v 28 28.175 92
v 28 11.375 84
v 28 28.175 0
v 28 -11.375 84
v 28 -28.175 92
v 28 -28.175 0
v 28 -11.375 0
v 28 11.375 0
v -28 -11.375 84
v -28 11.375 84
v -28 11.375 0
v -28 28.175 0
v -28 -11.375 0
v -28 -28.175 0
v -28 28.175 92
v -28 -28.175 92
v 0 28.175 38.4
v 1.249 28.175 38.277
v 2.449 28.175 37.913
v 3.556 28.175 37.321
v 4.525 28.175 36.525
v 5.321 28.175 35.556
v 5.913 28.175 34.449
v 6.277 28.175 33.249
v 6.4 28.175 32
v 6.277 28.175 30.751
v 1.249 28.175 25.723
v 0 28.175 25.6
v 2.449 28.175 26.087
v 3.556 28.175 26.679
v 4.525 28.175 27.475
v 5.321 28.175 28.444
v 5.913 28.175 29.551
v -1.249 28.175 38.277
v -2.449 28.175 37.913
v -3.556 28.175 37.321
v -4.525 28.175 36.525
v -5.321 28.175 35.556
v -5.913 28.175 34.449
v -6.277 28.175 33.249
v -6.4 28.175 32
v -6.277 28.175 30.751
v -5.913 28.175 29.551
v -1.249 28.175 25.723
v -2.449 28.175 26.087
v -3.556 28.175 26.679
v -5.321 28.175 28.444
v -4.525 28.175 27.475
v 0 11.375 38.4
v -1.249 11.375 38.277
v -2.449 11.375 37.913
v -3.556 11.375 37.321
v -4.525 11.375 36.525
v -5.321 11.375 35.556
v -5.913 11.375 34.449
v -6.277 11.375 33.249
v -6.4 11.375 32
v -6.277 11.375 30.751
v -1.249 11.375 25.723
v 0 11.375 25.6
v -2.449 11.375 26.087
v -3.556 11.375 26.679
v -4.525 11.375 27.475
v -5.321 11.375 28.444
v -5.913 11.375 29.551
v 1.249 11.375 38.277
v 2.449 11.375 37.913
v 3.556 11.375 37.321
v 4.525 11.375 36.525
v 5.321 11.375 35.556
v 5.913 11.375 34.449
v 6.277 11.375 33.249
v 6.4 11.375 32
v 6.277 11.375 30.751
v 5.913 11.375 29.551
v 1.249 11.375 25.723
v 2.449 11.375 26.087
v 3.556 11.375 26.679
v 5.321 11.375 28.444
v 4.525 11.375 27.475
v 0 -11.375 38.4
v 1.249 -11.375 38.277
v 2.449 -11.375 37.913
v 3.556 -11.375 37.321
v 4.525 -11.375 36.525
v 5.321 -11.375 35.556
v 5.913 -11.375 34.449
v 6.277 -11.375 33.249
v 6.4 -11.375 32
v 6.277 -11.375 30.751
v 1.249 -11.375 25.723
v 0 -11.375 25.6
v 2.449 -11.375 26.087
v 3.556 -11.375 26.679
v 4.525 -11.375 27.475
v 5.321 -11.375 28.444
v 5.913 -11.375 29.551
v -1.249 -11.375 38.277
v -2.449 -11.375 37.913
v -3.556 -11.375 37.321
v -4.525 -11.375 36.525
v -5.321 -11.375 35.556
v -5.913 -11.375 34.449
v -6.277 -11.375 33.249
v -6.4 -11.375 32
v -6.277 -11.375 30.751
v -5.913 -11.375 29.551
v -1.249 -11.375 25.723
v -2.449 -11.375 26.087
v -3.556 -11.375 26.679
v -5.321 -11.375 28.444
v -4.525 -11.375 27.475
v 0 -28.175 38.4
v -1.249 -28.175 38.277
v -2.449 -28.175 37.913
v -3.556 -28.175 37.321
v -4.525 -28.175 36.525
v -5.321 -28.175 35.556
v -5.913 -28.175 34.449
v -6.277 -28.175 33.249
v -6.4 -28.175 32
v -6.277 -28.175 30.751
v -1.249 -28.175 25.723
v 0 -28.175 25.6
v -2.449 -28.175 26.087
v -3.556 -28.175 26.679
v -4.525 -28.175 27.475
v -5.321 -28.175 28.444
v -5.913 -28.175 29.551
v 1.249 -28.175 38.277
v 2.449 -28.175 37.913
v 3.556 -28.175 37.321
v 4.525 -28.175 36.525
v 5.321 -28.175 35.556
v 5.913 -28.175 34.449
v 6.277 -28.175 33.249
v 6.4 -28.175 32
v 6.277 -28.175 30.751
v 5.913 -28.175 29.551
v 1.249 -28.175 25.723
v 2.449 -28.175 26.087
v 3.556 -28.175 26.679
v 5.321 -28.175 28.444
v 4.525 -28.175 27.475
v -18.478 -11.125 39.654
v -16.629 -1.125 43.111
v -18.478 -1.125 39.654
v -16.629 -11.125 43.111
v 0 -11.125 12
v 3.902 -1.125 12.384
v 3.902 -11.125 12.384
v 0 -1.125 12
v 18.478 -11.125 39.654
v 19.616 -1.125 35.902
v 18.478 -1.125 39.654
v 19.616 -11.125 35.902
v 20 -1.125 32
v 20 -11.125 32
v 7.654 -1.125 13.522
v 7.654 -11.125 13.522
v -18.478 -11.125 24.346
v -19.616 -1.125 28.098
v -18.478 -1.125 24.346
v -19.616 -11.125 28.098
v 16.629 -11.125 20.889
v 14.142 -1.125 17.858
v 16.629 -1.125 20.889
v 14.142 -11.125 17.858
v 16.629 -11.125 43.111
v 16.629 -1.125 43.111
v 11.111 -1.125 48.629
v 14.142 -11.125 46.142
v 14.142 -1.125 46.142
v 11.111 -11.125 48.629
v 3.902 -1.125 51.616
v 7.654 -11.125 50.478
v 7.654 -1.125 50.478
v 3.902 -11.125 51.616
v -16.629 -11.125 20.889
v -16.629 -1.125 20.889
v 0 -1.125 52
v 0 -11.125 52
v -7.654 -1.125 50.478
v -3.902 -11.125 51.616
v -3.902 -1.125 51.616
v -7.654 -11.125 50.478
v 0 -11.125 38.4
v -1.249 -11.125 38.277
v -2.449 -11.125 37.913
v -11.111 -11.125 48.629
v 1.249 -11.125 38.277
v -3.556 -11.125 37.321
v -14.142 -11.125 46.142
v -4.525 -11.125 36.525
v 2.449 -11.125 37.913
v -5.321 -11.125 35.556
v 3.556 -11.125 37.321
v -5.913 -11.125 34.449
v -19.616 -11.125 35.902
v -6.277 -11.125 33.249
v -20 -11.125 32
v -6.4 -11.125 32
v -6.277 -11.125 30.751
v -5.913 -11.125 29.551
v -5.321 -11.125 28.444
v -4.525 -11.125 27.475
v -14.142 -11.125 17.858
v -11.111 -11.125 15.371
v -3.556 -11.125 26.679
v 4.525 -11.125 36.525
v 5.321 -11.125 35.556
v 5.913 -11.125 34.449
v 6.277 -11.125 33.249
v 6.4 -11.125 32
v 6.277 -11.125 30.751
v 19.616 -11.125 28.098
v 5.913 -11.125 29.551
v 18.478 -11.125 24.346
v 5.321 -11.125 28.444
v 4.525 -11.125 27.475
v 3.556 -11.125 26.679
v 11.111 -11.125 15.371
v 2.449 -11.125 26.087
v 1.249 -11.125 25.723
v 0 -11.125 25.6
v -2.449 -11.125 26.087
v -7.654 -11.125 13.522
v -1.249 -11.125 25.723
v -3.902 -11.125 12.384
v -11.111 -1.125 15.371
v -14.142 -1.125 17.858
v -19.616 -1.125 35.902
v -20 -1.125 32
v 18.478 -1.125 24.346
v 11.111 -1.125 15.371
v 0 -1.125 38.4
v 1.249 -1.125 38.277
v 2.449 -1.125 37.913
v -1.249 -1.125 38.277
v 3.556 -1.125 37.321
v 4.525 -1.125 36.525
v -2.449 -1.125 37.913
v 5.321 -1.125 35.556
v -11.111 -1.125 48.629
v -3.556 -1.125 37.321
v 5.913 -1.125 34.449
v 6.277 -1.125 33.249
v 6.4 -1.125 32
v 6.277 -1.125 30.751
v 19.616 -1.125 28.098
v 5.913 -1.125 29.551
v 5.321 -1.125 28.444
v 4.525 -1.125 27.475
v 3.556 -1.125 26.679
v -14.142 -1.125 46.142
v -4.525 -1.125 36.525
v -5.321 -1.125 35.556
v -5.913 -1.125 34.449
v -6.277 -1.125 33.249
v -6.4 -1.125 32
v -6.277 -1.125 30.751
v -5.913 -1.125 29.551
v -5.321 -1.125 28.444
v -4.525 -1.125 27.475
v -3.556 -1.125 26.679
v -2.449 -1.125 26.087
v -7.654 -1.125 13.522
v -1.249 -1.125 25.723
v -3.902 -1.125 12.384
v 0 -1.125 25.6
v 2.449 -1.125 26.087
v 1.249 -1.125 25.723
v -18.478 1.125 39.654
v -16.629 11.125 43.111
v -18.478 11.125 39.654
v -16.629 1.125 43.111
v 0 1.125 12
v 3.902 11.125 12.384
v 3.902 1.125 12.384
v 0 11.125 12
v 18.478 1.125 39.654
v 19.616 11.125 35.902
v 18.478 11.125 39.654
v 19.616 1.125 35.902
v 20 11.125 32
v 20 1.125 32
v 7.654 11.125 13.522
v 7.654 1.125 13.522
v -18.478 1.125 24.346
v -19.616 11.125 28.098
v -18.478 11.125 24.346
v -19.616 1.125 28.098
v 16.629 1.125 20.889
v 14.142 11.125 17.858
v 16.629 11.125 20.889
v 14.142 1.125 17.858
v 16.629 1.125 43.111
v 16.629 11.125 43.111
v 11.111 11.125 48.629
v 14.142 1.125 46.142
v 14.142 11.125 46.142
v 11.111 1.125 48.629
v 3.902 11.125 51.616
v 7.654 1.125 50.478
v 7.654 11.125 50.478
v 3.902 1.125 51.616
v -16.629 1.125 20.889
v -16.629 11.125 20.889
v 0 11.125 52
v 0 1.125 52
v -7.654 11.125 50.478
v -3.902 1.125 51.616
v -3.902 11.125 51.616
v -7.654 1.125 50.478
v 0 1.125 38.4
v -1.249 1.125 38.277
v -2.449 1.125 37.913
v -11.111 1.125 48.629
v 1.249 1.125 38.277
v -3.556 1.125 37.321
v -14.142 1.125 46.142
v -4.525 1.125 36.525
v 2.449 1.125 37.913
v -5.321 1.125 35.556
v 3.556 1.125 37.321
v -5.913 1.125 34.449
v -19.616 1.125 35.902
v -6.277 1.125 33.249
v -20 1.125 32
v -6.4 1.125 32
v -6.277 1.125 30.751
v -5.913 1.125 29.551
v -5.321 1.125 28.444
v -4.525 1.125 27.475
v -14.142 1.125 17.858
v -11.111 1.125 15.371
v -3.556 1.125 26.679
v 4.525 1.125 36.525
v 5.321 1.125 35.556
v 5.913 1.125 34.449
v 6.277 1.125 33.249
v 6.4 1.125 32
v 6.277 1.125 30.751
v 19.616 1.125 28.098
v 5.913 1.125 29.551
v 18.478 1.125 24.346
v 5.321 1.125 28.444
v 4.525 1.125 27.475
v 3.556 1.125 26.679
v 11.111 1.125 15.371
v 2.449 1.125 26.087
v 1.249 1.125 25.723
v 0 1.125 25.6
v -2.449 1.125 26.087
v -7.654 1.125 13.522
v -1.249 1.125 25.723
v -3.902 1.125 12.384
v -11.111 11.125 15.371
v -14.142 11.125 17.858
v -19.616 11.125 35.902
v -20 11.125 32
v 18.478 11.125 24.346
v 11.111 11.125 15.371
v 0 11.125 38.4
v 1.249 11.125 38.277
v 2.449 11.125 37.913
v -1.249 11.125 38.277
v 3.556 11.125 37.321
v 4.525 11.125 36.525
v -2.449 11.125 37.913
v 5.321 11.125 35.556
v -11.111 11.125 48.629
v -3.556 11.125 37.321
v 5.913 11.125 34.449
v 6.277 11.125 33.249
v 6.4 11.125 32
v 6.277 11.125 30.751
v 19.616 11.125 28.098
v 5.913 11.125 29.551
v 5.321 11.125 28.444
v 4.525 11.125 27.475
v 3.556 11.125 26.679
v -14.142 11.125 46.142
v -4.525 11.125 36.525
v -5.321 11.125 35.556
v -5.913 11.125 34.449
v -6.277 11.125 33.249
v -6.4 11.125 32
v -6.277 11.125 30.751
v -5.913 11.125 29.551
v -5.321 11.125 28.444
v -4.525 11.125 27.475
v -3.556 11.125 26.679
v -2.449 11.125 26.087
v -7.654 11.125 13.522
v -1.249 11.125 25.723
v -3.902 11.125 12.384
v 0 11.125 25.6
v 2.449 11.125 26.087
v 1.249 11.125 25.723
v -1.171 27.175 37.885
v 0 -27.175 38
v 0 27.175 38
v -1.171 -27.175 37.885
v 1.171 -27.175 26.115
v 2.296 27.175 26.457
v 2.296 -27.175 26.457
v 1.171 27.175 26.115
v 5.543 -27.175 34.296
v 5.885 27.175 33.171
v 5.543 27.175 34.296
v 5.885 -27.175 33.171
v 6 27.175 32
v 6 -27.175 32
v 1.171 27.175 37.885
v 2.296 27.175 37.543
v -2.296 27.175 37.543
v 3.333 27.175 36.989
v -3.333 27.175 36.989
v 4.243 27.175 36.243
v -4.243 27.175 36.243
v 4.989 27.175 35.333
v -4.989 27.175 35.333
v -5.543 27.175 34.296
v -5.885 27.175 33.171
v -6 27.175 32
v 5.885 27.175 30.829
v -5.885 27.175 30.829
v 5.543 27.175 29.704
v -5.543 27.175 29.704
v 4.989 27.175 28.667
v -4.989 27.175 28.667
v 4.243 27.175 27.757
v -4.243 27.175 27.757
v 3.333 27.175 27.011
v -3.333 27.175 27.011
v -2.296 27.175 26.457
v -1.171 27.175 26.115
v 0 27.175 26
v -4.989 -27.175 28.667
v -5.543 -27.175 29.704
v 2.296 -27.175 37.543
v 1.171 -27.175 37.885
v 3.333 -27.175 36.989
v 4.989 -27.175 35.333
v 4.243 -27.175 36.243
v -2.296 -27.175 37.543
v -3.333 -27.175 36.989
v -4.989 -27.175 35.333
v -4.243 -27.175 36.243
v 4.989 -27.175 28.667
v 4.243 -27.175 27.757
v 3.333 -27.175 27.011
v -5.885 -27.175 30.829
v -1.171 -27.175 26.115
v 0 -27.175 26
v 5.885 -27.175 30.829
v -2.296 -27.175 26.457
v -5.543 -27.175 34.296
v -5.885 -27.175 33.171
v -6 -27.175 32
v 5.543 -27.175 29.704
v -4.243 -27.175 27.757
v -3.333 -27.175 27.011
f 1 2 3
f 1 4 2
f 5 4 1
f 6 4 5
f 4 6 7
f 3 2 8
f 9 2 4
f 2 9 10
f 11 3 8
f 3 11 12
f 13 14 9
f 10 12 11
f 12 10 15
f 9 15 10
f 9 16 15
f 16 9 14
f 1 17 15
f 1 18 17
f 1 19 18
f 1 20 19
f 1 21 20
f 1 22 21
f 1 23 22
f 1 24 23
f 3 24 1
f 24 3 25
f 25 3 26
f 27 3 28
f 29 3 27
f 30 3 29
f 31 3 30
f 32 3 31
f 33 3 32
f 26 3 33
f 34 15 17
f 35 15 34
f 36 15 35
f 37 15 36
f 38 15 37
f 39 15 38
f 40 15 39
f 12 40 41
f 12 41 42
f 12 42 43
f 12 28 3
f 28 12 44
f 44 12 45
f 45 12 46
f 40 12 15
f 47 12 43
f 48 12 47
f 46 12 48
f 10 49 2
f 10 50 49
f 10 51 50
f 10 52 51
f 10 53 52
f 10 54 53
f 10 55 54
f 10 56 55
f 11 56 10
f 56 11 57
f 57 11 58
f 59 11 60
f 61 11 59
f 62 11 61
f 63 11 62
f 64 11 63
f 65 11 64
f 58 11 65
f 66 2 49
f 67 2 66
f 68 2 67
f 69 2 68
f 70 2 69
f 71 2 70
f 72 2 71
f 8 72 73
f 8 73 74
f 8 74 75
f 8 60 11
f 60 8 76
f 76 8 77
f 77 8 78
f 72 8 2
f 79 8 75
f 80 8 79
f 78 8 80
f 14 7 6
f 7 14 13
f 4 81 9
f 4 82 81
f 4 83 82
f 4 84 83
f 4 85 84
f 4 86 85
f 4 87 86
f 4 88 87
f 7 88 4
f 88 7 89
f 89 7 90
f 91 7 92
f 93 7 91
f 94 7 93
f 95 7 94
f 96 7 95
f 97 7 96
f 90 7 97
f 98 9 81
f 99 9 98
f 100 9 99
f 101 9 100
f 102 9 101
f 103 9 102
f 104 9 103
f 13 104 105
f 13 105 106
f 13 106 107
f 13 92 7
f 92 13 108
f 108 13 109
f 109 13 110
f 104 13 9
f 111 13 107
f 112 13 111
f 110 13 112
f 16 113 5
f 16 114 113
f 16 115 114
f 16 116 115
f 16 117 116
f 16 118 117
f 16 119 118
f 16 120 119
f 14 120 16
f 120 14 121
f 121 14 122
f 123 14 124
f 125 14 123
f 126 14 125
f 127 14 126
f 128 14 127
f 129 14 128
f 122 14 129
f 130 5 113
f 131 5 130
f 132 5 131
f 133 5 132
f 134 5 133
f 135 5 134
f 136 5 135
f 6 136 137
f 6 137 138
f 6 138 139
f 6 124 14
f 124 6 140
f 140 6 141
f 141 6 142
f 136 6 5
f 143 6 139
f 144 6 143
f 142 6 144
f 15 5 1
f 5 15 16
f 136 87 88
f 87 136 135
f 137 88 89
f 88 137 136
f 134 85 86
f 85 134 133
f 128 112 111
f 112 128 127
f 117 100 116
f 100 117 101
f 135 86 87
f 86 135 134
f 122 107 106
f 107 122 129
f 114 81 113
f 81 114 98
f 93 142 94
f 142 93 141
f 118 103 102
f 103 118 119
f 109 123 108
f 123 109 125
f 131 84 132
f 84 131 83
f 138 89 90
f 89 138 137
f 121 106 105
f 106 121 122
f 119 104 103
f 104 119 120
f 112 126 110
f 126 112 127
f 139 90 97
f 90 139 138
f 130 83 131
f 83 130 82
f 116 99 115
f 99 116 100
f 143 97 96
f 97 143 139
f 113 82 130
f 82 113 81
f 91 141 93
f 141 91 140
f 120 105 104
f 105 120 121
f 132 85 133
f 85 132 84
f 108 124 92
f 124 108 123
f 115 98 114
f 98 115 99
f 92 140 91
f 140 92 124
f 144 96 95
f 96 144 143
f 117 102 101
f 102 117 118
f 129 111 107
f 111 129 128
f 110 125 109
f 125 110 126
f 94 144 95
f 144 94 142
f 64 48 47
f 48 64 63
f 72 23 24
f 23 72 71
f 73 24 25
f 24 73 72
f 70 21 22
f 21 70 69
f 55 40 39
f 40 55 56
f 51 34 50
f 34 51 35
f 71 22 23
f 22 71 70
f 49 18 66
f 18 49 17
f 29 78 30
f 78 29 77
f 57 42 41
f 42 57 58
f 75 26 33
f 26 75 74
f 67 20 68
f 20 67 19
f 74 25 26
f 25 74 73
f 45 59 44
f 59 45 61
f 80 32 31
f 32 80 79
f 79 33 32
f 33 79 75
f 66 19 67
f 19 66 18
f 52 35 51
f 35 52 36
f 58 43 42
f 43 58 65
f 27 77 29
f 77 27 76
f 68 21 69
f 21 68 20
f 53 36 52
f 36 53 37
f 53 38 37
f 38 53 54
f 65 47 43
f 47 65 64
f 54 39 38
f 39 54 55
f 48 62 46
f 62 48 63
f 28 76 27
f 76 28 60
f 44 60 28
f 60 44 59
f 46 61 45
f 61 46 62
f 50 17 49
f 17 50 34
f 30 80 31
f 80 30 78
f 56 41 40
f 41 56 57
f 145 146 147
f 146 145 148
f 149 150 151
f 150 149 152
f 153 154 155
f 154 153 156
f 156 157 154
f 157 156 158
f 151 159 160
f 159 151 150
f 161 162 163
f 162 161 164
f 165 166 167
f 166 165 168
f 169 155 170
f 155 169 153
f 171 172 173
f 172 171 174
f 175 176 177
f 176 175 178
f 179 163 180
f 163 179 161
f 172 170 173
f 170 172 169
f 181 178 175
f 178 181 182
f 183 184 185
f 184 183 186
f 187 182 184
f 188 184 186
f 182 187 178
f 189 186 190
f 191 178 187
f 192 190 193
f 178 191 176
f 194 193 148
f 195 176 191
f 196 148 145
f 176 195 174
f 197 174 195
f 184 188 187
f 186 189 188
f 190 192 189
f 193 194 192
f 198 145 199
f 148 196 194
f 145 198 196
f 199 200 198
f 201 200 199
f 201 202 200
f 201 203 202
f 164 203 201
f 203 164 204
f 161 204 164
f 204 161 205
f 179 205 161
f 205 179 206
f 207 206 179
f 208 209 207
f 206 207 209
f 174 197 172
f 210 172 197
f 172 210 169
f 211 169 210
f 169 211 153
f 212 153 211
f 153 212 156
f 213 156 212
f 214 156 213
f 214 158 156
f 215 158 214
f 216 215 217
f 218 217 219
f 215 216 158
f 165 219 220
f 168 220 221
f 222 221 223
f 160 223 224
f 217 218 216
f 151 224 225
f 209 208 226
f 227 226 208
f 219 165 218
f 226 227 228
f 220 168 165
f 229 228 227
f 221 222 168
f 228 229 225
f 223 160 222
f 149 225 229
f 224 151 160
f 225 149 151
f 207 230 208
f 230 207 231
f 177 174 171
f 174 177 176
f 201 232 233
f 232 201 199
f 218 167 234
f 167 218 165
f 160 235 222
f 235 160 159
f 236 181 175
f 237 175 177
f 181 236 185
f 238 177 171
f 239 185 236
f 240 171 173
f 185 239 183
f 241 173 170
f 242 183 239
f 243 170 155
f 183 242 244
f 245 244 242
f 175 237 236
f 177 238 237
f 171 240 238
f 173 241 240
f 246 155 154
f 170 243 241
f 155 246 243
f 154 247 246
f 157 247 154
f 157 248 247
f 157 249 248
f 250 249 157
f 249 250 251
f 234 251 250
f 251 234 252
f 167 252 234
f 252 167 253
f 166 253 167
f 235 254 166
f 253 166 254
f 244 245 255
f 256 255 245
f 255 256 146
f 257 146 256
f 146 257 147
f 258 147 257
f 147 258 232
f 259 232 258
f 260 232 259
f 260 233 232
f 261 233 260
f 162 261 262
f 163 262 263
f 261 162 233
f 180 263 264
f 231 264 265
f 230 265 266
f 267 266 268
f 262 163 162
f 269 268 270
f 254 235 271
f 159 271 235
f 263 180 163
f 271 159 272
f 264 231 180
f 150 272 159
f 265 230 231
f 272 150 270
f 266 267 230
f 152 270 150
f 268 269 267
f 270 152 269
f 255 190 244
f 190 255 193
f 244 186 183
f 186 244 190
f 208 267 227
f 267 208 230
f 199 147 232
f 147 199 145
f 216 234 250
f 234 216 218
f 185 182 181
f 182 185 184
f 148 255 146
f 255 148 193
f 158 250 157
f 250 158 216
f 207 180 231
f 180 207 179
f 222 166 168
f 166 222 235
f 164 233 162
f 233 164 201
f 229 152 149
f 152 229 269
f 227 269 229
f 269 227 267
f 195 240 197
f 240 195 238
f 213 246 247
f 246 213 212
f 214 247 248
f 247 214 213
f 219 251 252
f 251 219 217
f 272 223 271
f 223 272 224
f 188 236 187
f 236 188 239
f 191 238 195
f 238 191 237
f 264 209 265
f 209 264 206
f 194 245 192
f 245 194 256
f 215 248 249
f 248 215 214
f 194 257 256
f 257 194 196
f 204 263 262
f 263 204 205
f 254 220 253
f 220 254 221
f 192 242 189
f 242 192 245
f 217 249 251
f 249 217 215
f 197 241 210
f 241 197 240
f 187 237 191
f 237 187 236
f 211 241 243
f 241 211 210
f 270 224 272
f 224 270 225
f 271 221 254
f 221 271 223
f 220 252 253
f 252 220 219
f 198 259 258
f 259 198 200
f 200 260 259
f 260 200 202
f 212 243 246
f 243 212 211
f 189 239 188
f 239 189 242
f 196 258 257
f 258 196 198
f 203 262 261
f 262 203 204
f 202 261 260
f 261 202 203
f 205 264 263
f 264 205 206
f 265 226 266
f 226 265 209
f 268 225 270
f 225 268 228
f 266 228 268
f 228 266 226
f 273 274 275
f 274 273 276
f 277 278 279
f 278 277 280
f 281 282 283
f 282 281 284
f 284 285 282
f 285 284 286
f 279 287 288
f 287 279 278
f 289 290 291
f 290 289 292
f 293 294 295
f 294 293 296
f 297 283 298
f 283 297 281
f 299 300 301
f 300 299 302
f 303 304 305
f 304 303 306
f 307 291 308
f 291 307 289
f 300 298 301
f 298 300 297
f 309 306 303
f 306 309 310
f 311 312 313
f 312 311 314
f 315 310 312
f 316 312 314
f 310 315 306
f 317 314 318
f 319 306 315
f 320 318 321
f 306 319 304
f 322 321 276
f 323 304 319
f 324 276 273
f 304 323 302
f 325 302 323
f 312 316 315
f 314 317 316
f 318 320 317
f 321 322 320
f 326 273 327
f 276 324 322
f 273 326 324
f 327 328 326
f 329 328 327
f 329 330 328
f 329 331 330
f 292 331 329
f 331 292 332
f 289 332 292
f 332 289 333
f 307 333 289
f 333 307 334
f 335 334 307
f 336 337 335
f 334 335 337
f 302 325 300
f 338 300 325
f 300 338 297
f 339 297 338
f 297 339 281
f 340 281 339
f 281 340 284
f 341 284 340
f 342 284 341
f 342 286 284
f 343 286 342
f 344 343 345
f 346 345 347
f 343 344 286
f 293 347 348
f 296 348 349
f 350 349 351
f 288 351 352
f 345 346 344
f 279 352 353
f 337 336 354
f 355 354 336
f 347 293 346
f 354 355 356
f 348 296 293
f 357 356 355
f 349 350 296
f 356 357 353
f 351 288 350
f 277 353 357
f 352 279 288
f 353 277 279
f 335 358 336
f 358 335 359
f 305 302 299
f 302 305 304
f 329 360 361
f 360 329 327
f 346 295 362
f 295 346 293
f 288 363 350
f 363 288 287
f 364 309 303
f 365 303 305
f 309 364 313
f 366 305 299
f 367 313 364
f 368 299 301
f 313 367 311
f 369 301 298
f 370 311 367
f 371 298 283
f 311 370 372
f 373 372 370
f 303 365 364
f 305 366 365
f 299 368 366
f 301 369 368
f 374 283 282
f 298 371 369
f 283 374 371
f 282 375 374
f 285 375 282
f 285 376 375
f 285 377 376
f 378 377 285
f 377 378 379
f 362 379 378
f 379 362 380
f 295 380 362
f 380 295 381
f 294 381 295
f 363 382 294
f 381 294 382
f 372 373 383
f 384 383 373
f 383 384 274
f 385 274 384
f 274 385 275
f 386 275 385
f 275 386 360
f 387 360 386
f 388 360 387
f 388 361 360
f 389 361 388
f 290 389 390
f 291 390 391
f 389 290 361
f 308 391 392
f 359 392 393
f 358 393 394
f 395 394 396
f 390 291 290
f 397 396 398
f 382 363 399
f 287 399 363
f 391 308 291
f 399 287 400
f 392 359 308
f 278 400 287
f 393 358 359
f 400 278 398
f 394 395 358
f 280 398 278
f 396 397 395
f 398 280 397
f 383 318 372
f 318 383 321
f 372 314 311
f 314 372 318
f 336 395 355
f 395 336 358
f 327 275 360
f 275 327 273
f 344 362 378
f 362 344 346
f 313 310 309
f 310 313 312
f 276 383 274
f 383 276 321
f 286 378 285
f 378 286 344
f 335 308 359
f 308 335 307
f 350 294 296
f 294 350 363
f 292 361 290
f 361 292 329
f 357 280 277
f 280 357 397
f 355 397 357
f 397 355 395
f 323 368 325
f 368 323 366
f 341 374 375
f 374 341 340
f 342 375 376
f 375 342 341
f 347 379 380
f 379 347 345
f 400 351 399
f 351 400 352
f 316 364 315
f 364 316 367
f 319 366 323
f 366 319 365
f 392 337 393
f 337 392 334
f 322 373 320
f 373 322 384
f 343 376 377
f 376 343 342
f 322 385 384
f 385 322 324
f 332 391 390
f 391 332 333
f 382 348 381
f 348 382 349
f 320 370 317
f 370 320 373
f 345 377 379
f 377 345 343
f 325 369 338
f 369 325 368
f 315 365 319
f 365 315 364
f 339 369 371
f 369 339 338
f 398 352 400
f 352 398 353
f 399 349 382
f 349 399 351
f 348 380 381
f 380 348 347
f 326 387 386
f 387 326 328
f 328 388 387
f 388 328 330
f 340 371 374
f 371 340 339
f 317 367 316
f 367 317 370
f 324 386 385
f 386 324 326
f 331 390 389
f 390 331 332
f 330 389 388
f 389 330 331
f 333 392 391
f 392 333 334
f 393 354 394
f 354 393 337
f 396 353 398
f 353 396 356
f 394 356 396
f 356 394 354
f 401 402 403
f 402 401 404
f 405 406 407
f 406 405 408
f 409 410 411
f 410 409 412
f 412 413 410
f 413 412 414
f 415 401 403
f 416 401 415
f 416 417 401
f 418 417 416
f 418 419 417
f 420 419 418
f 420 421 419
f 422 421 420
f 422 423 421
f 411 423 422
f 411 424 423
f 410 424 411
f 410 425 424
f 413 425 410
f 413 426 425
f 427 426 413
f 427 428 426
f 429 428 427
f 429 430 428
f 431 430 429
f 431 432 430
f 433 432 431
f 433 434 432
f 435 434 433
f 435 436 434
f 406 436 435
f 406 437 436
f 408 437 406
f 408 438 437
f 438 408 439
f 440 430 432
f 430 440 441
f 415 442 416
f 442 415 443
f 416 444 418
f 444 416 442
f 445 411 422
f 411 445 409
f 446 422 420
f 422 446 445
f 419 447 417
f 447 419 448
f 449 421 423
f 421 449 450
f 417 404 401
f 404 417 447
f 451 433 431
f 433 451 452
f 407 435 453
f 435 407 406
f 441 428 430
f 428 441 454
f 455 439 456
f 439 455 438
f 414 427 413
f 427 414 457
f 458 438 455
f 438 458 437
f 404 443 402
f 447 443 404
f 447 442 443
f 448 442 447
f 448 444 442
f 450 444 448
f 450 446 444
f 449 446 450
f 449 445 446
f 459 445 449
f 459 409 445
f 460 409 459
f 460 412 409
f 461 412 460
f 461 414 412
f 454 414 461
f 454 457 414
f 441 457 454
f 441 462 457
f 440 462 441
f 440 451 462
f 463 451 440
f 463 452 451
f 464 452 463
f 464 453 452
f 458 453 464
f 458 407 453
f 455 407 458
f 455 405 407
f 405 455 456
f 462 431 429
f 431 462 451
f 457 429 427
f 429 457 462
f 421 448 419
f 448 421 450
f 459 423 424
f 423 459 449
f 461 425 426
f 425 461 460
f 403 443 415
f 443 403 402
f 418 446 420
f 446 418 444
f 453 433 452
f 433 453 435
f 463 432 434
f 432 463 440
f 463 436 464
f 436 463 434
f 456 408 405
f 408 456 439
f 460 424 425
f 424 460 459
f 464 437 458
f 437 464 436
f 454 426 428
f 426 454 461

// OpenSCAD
$fn = 32;

// ------------------------------------------------------------------------
// Trolley wheel set: wheels d40, fork 84 mm tall
// Every part is its own module, assembly() places every instance.
// ------------------------------------------------------------------------

// --- part 1 ---
module trolley_fork() {
  difference() {
    union() {
      translate([-28, 11.375, 0]) cube([56, 16.8, 84]);
      translate([-28, -28.175, 0]) cube([56, 16.8, 84]);
      translate([-28, -28.175, 84]) cube([56, 56.35, 8]);
    }
    translate([0, -19.775, 32]) rotate([90, 0, 0]) cylinder(h = 18.8, d = 12.8, center = true);
    translate([0, 19.775, 32]) rotate([90, 0, 0]) cylinder(h = 18.8, d = 12.8, center = true);
  }
}

// --- part 2 ---
module trolley_wheel() {
  difference() {
      translate([0, 0, 0]) cylinder(h = 10, d = 40);
      translate([0, 0, -1]) cylinder(h = 12, d = 12.8);
    }
}

// --- part 3 ---
module trolley_axle() {
  translate([0, 0, -27.175]) cylinder(h = 54.35, d = 12);
}

// --- assembly ---
module assembly() {
  color([0.80, 0.24, 0.20]) translate([0, 0, 0]) rotate([0, 0, 0]) trolley_fork();
  color([0.20, 0.45, 0.75]) translate([0, -1.125, 32]) rotate([90, 0, 0]) trolley_wheel();
  color([0.25, 0.62, 0.32]) translate([0, 11.125, 32]) rotate([90, 0, 0]) trolley_wheel();
  color([0.92, 0.70, 0.18]) translate([0, 0, 32]) rotate([90, 0, 0]) trolley_axle();
}

assembly();
